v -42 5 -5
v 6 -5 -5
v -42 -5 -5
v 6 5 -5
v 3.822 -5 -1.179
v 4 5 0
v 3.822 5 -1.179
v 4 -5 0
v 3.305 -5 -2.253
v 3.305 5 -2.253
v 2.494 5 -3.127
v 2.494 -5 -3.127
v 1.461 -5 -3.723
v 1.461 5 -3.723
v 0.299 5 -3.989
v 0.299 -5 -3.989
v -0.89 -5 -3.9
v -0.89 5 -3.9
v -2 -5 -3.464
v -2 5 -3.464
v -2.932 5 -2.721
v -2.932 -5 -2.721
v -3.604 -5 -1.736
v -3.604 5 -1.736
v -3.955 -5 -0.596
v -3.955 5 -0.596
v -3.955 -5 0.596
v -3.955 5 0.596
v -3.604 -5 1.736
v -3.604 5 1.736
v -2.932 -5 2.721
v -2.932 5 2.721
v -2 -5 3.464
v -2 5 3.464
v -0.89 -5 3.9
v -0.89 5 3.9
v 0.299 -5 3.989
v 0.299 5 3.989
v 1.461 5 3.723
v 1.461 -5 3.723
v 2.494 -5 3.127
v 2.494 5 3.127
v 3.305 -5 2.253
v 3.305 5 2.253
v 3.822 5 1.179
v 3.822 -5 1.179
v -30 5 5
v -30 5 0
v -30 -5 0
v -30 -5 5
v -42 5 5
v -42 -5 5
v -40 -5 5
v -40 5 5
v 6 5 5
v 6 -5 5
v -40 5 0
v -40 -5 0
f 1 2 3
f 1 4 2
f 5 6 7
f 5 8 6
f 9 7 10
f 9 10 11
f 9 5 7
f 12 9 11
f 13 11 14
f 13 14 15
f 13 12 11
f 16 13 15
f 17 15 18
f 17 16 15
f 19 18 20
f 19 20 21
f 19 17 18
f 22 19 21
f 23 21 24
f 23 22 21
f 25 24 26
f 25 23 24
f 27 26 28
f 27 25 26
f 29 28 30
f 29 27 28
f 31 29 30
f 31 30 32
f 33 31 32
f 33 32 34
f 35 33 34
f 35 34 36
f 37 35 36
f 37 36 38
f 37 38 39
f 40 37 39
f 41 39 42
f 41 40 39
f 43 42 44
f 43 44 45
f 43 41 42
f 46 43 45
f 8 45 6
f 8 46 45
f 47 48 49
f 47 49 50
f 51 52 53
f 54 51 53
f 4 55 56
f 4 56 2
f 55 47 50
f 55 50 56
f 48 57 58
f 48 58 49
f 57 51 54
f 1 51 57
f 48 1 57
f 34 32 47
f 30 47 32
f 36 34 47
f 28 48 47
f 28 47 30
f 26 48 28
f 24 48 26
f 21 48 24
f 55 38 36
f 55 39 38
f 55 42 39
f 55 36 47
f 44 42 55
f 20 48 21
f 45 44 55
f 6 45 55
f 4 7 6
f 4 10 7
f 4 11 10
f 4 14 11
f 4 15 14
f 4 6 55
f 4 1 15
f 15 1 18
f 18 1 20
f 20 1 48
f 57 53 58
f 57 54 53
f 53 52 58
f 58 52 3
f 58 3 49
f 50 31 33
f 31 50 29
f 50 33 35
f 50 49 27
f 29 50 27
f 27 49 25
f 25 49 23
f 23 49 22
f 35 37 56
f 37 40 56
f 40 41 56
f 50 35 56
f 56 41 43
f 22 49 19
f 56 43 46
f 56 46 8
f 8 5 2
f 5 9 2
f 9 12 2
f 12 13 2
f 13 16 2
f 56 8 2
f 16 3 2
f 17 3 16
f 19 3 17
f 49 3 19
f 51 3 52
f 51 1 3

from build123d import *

# Parameters (mm, degrees)
SKETCH_1_R      = 4
EXTRUDE_1_DEPTH = 5


with BuildPart() as part:
    # 草圖1 → 填料-伸長1 (new body, symmetric)
    with BuildSketch(Plane(origin=(0, 0, 0), x_dir=(1, 0, 0), z_dir=(0, 1, 0))):
        Polygon((-40, -5), (-40, 0), (-30, 0), (-30, -5), (6, -5), (6, 5), (-42, 5), (-42, -5), align=None)
        Circle(SKETCH_1_R, mode=Mode.SUBTRACT)
    extrude(amount=EXTRUDE_1_DEPTH, both=True)


solid = part.part
